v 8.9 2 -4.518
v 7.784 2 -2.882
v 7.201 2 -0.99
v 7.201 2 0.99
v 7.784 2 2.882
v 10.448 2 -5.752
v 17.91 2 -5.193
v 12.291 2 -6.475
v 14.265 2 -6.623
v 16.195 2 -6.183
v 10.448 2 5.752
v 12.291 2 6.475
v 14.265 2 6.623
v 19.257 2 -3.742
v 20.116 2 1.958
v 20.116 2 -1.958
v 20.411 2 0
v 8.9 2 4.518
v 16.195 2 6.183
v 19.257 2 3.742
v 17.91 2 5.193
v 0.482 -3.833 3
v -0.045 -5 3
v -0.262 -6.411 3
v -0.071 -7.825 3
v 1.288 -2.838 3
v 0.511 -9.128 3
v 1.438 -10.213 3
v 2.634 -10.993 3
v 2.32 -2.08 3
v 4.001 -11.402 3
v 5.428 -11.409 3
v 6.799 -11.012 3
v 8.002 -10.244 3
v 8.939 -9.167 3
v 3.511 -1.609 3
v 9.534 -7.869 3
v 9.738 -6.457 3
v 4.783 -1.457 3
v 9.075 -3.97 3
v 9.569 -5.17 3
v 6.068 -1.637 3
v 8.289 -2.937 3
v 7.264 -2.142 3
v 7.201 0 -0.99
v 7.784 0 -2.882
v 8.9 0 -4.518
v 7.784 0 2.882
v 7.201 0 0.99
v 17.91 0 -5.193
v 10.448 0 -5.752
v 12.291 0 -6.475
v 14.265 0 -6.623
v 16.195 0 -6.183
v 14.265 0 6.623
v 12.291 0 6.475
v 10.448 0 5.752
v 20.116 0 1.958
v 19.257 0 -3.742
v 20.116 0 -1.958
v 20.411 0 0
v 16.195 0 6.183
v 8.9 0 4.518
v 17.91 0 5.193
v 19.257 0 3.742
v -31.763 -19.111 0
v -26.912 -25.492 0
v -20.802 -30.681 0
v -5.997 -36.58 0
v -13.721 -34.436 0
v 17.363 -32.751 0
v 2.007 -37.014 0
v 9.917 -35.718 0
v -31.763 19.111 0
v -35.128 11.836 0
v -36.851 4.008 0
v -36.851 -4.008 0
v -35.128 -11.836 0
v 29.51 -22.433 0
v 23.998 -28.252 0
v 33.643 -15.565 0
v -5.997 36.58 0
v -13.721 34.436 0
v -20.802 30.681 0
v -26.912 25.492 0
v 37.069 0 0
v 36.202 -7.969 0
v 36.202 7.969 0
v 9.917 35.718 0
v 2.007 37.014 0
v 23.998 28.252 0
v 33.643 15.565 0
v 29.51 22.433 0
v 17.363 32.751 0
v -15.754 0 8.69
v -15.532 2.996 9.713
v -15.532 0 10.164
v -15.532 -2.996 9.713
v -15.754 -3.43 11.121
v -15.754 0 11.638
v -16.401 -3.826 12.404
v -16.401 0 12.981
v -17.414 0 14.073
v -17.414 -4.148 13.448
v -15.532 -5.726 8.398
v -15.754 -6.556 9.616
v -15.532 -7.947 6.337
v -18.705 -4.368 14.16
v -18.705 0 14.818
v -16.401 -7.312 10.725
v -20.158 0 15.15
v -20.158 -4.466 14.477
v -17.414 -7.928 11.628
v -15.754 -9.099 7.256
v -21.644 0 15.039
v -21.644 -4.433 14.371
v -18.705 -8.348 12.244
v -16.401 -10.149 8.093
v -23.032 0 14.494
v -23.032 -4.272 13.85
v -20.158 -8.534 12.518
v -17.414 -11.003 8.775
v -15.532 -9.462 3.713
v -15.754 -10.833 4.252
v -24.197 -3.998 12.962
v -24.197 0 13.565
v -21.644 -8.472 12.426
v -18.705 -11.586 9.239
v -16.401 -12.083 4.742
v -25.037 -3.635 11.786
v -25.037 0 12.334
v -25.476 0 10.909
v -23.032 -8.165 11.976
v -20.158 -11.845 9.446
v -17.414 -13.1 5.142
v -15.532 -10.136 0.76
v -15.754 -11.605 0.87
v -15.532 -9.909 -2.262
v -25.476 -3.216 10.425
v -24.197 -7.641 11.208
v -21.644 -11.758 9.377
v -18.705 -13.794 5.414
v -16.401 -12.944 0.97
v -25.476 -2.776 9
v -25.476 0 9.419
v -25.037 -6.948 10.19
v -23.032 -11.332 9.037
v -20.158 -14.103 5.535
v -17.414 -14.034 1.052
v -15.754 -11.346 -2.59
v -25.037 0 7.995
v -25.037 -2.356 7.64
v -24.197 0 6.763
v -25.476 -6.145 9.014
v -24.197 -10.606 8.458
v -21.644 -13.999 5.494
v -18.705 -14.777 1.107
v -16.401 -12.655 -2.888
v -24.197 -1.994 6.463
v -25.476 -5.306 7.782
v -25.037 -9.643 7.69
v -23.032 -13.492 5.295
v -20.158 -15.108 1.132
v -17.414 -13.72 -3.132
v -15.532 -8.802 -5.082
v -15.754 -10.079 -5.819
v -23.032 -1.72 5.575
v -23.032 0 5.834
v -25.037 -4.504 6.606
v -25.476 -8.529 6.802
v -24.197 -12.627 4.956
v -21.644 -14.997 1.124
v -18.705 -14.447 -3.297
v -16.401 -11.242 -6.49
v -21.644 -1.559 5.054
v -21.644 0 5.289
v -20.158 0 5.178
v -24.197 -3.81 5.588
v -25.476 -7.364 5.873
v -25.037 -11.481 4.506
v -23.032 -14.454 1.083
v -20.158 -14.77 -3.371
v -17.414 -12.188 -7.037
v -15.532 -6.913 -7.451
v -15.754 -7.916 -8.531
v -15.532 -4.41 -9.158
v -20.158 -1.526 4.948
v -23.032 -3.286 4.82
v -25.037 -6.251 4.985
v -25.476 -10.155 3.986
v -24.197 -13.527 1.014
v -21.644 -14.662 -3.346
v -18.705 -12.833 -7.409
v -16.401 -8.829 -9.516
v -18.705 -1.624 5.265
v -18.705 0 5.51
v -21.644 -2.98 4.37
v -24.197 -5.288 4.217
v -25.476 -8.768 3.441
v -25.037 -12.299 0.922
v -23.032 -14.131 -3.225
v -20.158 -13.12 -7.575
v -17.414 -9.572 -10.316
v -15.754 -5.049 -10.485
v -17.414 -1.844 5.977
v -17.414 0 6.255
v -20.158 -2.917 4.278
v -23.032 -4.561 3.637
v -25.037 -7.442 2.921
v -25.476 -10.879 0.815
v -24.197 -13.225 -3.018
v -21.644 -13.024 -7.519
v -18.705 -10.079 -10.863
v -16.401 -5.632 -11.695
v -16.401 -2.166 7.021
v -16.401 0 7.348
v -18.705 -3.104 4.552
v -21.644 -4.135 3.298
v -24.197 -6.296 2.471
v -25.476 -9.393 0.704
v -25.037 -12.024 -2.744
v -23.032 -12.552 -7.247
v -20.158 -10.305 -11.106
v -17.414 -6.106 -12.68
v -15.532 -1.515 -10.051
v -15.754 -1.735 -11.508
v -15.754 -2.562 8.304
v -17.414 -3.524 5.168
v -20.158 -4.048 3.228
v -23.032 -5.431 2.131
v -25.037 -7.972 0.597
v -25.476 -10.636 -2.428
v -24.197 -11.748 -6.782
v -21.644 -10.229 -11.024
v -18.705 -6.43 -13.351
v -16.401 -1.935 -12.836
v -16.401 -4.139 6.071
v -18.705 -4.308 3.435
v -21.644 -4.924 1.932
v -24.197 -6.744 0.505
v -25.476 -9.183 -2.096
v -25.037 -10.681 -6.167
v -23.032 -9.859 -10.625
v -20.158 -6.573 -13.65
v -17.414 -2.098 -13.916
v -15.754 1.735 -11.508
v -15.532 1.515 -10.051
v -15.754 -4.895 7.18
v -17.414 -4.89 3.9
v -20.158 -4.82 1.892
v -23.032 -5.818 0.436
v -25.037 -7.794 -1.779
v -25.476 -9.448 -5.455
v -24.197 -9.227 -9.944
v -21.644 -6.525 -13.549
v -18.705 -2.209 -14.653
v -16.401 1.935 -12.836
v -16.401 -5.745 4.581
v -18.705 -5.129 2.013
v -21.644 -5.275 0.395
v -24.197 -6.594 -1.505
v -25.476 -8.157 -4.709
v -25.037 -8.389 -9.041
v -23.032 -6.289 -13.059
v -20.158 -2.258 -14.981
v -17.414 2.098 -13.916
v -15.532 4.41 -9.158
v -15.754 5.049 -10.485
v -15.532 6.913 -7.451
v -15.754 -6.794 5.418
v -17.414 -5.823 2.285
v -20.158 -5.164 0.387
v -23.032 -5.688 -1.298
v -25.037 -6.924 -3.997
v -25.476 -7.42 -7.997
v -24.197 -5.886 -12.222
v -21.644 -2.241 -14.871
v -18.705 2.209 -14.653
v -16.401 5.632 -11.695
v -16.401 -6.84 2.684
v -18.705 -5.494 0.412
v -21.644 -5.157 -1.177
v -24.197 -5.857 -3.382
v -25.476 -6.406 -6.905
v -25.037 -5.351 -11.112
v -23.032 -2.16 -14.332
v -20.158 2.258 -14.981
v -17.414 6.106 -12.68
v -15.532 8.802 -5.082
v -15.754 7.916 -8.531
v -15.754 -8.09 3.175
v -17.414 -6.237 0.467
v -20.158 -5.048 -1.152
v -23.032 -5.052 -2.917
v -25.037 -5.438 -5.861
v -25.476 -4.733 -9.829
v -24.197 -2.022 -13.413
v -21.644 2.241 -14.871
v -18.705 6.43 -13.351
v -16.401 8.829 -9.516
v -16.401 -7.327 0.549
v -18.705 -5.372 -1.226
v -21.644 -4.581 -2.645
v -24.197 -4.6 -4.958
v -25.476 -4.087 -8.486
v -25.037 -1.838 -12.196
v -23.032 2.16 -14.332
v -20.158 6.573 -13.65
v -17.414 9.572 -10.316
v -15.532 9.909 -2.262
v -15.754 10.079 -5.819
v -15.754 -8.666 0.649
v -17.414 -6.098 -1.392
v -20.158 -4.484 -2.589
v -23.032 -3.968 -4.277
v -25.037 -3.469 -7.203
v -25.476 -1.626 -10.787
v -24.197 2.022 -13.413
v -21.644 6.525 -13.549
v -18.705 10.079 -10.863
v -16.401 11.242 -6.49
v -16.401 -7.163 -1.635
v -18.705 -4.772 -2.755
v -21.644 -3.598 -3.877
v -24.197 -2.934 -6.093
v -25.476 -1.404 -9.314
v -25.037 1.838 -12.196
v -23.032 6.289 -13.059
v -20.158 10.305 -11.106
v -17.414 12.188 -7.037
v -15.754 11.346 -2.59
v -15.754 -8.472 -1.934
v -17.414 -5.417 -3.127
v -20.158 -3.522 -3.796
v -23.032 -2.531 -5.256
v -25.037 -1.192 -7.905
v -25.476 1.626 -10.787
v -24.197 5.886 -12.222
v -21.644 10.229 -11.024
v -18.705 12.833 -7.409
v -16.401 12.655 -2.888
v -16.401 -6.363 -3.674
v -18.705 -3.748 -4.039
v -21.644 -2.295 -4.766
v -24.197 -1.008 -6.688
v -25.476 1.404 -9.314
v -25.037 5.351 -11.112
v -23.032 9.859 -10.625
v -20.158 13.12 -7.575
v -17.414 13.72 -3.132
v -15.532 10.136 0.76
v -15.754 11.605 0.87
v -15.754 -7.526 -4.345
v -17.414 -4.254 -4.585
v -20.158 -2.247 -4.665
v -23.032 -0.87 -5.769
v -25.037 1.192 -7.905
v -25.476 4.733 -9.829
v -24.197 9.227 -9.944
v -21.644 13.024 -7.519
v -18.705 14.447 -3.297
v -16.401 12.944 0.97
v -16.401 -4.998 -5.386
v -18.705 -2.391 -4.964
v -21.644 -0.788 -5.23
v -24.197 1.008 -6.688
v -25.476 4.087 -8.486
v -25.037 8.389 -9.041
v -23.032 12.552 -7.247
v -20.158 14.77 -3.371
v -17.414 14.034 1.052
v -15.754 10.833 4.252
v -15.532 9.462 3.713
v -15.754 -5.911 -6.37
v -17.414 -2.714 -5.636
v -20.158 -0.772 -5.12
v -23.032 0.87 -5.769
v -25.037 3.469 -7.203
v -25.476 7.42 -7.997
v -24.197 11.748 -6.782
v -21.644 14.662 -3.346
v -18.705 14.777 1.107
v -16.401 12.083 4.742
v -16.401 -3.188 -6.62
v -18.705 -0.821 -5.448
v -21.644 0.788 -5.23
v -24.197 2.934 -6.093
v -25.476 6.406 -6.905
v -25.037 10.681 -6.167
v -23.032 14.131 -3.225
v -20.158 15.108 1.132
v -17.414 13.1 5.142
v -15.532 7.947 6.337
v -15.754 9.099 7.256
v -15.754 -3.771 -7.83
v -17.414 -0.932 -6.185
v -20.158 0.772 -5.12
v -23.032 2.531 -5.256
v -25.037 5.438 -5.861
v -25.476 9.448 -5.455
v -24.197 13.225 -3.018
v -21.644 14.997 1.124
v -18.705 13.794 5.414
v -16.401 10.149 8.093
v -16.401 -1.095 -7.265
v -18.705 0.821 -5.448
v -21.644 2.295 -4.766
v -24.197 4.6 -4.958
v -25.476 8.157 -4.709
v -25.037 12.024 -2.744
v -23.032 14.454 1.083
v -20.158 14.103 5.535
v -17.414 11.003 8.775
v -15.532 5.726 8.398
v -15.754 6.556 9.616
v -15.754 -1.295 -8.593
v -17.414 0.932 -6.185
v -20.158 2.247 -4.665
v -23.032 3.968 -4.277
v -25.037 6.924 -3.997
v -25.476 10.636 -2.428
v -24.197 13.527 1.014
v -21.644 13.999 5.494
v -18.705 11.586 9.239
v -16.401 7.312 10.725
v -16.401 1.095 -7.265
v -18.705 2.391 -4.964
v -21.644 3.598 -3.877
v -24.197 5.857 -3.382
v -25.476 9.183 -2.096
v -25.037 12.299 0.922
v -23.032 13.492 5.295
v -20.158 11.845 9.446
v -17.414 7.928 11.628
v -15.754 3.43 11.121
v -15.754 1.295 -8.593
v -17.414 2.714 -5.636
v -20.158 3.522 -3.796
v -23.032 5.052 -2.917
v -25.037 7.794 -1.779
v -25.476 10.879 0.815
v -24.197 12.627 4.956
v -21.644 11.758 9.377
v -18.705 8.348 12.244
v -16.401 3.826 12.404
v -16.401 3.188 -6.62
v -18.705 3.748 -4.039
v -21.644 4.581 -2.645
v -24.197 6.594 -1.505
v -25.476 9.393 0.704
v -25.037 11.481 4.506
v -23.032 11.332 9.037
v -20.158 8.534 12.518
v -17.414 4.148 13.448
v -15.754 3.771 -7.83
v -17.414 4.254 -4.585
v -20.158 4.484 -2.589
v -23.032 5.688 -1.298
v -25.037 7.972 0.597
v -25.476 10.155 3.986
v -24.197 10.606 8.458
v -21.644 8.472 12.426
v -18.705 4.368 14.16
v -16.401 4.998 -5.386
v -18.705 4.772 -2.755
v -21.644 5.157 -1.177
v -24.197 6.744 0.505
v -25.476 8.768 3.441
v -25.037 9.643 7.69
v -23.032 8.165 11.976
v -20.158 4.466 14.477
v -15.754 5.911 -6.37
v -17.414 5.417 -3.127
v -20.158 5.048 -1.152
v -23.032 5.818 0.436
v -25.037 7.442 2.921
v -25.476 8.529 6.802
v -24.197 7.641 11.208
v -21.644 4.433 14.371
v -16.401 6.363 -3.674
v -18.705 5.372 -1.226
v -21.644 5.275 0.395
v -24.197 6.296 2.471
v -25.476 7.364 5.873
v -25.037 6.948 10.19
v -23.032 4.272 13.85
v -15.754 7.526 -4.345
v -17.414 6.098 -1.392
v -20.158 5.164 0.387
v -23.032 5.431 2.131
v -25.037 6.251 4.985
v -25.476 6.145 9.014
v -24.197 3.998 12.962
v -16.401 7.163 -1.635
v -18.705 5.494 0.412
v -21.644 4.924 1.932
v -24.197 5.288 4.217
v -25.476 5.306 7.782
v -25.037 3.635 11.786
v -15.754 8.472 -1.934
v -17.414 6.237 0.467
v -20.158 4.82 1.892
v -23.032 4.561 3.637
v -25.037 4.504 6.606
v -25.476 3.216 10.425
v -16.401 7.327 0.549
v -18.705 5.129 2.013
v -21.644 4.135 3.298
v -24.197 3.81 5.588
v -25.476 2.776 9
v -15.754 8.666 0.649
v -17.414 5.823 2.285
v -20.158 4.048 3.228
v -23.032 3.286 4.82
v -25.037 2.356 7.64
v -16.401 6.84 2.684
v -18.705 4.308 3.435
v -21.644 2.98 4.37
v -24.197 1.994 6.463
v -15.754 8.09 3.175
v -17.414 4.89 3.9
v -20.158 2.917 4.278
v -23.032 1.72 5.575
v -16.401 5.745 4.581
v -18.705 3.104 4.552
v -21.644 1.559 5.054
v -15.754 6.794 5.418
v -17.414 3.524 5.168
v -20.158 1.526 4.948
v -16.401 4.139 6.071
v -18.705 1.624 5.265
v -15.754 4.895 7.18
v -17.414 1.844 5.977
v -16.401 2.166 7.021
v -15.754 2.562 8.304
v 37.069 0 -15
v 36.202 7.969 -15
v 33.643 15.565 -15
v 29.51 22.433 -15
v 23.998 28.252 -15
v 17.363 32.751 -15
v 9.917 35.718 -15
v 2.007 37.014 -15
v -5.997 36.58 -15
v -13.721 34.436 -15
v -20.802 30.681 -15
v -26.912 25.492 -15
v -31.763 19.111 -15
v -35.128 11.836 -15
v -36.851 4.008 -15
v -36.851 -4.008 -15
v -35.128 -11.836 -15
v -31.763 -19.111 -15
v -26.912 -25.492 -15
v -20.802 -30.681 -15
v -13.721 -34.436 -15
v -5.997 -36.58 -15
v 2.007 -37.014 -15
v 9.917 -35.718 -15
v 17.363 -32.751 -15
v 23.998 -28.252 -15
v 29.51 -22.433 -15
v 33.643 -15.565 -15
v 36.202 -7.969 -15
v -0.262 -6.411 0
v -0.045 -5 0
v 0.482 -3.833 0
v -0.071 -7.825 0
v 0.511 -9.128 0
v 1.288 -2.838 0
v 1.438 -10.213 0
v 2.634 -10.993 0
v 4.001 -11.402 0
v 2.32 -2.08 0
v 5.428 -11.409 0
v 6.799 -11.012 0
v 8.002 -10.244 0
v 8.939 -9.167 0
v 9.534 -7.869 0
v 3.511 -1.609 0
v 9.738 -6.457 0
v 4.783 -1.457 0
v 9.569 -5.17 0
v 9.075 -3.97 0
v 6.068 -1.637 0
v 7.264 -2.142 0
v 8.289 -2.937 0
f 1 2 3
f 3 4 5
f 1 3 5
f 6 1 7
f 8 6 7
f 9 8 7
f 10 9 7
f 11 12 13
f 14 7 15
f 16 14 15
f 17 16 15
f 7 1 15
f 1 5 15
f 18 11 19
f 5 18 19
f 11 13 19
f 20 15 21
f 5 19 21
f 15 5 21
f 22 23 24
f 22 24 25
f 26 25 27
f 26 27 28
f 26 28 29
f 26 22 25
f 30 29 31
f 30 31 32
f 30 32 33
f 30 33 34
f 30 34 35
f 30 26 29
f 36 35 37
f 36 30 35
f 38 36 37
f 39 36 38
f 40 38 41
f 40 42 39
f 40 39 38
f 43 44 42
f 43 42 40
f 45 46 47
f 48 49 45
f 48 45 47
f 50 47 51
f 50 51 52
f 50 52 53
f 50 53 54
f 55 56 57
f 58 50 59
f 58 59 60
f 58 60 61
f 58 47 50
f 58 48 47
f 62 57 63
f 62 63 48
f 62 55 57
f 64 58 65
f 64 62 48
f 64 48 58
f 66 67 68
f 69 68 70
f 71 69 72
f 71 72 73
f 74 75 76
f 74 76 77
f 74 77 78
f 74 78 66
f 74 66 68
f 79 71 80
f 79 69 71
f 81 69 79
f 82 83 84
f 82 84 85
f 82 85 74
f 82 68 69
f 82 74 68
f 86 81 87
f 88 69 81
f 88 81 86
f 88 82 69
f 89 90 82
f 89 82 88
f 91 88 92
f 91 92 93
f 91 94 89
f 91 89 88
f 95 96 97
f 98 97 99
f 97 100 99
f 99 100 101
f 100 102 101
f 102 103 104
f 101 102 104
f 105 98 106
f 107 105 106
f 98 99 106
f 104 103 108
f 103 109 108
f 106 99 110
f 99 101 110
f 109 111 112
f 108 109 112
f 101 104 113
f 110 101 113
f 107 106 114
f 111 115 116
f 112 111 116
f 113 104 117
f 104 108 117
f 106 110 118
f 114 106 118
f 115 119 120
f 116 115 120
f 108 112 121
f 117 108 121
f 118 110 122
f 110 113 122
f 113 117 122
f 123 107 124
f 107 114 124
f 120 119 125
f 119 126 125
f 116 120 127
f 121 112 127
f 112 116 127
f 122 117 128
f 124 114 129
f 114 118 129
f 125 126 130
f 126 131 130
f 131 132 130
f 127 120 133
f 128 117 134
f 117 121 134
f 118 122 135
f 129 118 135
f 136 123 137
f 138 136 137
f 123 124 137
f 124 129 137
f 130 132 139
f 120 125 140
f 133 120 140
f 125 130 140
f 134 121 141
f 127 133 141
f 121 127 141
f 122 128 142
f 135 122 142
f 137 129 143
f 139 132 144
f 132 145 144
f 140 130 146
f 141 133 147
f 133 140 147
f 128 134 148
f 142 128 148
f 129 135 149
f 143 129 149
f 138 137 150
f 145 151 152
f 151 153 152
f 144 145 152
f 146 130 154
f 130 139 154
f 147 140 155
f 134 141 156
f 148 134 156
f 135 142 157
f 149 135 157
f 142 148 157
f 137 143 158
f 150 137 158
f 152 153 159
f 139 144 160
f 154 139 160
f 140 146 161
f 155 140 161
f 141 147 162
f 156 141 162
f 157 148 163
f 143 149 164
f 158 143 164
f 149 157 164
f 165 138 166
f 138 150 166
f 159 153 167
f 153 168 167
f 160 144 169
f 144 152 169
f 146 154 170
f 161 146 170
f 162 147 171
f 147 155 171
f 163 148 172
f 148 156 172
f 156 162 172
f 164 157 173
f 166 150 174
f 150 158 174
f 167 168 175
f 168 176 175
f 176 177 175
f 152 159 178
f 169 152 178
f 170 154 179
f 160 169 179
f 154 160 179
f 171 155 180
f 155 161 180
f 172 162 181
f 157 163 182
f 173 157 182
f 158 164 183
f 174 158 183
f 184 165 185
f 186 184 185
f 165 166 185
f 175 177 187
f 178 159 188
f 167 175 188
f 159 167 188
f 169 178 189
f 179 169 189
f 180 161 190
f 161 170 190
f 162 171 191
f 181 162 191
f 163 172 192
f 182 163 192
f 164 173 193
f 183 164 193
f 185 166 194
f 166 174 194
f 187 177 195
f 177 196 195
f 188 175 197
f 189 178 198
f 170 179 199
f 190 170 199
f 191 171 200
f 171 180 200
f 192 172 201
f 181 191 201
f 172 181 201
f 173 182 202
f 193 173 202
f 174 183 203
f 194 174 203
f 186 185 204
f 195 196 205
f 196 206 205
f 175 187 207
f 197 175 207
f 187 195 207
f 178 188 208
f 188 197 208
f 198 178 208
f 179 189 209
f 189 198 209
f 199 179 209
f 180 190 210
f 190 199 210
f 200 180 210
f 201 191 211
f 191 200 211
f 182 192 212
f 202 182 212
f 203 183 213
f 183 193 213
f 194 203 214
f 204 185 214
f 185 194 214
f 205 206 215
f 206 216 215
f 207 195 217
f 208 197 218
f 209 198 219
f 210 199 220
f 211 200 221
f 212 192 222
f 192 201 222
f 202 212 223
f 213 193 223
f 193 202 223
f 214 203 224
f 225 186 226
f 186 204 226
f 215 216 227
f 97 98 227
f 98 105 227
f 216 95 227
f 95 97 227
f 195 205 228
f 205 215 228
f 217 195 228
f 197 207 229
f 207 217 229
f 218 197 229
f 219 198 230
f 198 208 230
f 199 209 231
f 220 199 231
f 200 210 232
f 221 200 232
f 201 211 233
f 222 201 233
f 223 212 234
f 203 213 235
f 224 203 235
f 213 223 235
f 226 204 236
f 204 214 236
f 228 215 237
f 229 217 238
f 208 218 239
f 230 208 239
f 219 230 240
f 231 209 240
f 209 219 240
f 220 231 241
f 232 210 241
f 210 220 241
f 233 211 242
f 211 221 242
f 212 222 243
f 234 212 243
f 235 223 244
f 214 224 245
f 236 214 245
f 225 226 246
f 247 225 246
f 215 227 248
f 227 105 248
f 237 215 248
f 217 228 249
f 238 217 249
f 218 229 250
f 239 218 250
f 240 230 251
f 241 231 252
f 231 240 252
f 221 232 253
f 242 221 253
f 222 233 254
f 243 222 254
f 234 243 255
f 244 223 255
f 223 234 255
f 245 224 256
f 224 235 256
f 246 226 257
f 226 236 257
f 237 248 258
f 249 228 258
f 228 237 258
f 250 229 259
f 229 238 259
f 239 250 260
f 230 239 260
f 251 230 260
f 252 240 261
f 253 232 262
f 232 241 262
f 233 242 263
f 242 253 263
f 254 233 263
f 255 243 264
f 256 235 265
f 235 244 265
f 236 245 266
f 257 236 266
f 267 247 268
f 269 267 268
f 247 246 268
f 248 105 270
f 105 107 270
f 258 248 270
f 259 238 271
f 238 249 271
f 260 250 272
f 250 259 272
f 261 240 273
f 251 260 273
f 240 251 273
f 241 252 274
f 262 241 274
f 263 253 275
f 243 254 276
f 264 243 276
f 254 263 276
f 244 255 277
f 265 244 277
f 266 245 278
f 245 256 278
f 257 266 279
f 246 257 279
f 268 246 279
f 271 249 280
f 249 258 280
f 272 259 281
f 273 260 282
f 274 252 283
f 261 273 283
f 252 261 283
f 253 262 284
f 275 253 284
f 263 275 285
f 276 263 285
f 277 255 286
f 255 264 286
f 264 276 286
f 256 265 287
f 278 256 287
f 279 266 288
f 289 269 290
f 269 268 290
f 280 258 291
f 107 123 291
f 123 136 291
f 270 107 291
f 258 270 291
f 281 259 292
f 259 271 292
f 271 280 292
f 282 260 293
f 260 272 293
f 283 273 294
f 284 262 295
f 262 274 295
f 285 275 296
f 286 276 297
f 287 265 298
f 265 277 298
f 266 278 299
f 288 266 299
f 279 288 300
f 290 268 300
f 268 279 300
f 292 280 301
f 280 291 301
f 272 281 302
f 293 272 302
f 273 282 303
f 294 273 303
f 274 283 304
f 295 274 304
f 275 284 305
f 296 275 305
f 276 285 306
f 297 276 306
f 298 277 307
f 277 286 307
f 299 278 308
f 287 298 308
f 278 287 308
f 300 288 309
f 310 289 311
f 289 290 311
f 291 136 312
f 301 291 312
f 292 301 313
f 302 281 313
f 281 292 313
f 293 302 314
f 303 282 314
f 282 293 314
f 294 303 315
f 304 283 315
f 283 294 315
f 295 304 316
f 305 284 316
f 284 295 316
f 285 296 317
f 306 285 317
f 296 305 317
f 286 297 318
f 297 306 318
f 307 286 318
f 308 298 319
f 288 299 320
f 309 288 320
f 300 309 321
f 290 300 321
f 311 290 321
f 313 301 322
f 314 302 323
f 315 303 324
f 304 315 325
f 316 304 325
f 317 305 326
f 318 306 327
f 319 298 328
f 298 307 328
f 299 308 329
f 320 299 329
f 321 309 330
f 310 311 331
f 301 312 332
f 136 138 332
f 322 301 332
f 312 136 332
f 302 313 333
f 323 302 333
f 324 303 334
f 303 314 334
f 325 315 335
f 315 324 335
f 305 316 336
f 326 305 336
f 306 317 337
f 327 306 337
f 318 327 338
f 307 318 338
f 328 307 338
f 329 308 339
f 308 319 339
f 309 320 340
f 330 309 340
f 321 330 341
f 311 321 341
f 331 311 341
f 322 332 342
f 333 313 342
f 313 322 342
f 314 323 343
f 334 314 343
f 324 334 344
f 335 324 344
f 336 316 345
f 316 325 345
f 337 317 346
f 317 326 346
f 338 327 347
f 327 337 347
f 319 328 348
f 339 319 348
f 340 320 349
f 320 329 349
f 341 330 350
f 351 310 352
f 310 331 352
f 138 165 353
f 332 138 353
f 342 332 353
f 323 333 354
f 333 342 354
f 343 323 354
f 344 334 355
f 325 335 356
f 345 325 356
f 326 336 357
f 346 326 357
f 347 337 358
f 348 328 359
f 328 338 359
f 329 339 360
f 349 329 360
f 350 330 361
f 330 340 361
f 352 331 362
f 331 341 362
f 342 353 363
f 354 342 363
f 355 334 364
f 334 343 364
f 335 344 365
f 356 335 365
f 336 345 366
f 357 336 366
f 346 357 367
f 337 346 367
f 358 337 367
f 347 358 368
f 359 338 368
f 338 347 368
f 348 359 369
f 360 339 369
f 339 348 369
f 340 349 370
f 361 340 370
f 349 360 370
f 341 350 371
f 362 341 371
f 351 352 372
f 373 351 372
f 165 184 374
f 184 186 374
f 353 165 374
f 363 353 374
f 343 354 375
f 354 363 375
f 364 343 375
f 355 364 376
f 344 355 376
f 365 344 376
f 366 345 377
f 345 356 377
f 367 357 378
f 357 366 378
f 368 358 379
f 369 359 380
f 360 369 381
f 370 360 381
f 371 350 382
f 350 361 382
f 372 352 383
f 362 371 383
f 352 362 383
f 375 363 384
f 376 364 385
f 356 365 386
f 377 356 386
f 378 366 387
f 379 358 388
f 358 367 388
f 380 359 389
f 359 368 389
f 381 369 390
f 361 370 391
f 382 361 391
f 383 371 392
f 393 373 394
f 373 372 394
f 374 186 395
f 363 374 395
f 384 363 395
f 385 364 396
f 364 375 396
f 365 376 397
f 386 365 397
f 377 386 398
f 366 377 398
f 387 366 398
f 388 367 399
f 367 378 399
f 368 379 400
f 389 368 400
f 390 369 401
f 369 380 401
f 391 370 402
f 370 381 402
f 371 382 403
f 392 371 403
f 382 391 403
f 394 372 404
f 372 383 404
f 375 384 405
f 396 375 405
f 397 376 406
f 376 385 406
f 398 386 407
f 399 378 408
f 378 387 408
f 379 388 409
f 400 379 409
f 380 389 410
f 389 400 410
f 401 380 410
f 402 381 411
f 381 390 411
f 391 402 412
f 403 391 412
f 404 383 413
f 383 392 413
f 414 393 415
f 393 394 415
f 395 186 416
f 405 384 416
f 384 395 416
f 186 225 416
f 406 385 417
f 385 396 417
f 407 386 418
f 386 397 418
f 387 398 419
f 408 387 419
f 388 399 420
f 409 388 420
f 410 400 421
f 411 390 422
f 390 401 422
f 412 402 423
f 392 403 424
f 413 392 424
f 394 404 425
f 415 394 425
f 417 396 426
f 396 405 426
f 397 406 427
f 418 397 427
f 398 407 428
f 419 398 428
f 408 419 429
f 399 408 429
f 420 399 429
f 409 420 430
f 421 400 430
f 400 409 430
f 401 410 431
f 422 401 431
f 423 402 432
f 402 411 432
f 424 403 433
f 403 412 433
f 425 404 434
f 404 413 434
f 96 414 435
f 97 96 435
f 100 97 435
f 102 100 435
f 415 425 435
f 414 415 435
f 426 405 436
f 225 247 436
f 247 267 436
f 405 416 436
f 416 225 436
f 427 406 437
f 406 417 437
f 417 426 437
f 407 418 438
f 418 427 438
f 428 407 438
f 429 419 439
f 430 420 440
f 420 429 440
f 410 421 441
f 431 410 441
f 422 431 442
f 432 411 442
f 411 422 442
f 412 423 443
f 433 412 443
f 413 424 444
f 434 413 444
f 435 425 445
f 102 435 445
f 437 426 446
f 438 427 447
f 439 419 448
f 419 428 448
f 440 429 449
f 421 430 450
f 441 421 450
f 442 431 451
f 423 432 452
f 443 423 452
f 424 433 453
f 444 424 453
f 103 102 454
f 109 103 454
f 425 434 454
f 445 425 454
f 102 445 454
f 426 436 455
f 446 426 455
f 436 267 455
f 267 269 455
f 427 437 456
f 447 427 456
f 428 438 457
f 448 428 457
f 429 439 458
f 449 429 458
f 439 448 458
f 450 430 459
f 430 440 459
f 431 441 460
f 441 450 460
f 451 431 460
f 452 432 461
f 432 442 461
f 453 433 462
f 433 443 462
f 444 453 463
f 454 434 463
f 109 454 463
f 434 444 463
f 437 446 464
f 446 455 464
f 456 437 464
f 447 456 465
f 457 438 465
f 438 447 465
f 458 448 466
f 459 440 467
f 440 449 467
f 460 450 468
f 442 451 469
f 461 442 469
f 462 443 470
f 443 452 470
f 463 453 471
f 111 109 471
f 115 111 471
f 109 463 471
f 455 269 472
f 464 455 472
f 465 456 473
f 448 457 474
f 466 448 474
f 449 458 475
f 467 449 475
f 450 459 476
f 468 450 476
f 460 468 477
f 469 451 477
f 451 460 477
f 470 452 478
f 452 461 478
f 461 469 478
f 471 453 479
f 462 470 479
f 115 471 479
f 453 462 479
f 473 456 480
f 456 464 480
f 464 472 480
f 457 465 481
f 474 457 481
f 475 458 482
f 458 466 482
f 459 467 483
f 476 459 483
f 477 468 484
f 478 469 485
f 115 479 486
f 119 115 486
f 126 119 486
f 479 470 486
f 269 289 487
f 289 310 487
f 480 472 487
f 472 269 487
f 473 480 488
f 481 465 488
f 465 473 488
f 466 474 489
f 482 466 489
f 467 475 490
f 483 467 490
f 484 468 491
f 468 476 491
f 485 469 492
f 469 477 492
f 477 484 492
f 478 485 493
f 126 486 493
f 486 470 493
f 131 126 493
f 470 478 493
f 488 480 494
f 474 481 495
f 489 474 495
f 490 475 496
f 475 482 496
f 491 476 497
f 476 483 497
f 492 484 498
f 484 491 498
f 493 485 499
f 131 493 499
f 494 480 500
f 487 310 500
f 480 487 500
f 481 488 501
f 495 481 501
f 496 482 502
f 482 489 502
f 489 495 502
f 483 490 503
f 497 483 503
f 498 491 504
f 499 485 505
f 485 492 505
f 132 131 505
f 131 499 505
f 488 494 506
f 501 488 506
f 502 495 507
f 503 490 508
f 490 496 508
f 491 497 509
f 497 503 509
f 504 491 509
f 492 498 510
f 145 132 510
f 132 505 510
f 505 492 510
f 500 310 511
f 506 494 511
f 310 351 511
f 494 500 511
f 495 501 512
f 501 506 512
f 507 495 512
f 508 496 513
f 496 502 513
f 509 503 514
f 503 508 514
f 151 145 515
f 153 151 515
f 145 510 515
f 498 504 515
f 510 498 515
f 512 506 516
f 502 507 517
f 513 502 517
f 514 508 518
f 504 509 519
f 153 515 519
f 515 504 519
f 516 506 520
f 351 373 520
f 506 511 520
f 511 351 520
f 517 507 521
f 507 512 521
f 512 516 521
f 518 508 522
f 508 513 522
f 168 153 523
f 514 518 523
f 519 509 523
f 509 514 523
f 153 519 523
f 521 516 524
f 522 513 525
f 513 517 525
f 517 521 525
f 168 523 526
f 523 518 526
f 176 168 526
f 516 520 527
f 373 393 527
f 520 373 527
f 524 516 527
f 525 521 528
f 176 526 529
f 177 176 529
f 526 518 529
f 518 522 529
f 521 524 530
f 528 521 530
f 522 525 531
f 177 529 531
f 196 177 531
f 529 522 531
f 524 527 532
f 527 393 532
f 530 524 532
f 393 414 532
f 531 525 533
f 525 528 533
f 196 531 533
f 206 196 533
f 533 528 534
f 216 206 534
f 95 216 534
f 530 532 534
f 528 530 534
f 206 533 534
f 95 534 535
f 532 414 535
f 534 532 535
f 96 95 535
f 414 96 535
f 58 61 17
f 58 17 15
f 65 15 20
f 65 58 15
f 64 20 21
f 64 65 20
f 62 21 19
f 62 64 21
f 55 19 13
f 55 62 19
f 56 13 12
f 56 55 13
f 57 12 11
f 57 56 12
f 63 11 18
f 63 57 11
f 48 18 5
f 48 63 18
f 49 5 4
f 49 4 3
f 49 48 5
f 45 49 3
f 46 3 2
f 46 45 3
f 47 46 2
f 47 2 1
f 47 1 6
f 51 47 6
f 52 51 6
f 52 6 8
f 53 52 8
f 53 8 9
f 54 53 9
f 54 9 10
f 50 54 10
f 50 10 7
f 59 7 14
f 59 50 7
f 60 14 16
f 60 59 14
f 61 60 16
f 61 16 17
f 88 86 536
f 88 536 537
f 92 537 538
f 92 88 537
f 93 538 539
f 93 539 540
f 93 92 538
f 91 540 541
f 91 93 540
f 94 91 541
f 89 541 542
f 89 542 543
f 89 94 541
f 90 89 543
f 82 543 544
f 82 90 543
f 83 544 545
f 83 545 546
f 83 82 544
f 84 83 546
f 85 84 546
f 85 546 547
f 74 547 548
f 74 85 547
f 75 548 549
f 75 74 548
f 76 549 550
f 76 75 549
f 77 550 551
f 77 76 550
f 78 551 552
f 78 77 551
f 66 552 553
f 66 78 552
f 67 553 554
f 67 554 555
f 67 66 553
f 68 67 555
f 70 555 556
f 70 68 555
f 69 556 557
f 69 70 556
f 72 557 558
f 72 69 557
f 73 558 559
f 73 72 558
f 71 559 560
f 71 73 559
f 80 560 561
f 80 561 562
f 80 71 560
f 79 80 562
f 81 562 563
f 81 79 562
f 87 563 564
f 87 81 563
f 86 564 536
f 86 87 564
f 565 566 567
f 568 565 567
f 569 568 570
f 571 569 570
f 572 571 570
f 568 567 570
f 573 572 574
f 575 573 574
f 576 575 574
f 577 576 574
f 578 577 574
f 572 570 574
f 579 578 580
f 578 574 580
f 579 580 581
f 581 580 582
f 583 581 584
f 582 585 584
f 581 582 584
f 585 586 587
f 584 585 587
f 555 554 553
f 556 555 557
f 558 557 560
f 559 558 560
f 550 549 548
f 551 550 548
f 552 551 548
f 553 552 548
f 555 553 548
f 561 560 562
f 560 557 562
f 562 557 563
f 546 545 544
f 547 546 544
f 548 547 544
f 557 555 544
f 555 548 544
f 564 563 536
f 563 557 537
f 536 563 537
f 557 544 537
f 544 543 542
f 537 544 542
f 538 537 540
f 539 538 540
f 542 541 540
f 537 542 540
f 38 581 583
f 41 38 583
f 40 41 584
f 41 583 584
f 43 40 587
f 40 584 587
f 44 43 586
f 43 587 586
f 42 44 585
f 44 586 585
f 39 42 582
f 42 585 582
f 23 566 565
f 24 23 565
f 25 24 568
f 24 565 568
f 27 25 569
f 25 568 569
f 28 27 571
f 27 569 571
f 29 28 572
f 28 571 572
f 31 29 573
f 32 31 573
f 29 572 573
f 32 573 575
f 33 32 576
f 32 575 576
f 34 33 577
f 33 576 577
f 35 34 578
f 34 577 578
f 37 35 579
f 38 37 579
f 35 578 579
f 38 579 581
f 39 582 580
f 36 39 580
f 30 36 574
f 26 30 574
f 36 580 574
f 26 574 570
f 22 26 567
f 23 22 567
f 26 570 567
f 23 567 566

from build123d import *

# Parameters (mm, degrees)
F0_R     = 5
F3_DEPTH = 3
F5_R     = 6.6420227727
F6_DEPTH = 2
F4_R     = 37.0687121763
F7_DEPTH = 15


with BuildPart() as f1:
    # F0 (on Front) → F1 (revolve)
    with BuildSketch(Plane.XZ):
        with Locations((-20.5318288077, 10.1641240577)):
            Circle(F0_R)
    revolve(axis=Axis((-18.9214901471, 0, 0), (1, 0, 0)))


with BuildPart() as f3:
    # F2 (on Top) → F3 (new body)
    with BuildSketch(Plane.XY):
        with BuildLine():
            ThreePointArc((4.7830105194, -1.4569867436), (1.7797639387, -2.4255630386), (-0.0453284697, -4.9997945288))
            ThreePointArc((-0.0453284697, -4.9997945288), (2.9579181111, -4.0312182338), (4.7830105194, -1.4569867436))
        make_face()
        with BuildLine():
            ThreePointArc((4.7830105194, -1.4569867436), (2.9579181111, -4.0312182338), (-0.0453284697, -4.9997945288))
            ThreePointArc((-0.0453284697, -4.9997945288), (4.0011539095, -11.4022363877), (9.7376820497, -6.4567812723))
            ThreePointArc((9.7376820497, -6.4567812723), (8.2892058318, -2.9373098879), (4.7830105194, -1.4569867436))
        make_face()
    extrude(amount=F3_DEPTH)


with BuildPart() as f6:
    # F5 (on Front) → F6 (new body)
    with BuildSketch(Plane.XZ):
        with Locations((13.768658042, 0)):
            Circle(F5_R)
    extrude(amount=-F6_DEPTH)


with BuildPart() as f7:
    # F4 (on Top) → F7 (new body)
    with BuildSketch(Plane.XY):
        Circle(F4_R)
    extrude(amount=-F7_DEPTH)


solid = Compound([f1.part, f3.part, f6.part, f7.part])
